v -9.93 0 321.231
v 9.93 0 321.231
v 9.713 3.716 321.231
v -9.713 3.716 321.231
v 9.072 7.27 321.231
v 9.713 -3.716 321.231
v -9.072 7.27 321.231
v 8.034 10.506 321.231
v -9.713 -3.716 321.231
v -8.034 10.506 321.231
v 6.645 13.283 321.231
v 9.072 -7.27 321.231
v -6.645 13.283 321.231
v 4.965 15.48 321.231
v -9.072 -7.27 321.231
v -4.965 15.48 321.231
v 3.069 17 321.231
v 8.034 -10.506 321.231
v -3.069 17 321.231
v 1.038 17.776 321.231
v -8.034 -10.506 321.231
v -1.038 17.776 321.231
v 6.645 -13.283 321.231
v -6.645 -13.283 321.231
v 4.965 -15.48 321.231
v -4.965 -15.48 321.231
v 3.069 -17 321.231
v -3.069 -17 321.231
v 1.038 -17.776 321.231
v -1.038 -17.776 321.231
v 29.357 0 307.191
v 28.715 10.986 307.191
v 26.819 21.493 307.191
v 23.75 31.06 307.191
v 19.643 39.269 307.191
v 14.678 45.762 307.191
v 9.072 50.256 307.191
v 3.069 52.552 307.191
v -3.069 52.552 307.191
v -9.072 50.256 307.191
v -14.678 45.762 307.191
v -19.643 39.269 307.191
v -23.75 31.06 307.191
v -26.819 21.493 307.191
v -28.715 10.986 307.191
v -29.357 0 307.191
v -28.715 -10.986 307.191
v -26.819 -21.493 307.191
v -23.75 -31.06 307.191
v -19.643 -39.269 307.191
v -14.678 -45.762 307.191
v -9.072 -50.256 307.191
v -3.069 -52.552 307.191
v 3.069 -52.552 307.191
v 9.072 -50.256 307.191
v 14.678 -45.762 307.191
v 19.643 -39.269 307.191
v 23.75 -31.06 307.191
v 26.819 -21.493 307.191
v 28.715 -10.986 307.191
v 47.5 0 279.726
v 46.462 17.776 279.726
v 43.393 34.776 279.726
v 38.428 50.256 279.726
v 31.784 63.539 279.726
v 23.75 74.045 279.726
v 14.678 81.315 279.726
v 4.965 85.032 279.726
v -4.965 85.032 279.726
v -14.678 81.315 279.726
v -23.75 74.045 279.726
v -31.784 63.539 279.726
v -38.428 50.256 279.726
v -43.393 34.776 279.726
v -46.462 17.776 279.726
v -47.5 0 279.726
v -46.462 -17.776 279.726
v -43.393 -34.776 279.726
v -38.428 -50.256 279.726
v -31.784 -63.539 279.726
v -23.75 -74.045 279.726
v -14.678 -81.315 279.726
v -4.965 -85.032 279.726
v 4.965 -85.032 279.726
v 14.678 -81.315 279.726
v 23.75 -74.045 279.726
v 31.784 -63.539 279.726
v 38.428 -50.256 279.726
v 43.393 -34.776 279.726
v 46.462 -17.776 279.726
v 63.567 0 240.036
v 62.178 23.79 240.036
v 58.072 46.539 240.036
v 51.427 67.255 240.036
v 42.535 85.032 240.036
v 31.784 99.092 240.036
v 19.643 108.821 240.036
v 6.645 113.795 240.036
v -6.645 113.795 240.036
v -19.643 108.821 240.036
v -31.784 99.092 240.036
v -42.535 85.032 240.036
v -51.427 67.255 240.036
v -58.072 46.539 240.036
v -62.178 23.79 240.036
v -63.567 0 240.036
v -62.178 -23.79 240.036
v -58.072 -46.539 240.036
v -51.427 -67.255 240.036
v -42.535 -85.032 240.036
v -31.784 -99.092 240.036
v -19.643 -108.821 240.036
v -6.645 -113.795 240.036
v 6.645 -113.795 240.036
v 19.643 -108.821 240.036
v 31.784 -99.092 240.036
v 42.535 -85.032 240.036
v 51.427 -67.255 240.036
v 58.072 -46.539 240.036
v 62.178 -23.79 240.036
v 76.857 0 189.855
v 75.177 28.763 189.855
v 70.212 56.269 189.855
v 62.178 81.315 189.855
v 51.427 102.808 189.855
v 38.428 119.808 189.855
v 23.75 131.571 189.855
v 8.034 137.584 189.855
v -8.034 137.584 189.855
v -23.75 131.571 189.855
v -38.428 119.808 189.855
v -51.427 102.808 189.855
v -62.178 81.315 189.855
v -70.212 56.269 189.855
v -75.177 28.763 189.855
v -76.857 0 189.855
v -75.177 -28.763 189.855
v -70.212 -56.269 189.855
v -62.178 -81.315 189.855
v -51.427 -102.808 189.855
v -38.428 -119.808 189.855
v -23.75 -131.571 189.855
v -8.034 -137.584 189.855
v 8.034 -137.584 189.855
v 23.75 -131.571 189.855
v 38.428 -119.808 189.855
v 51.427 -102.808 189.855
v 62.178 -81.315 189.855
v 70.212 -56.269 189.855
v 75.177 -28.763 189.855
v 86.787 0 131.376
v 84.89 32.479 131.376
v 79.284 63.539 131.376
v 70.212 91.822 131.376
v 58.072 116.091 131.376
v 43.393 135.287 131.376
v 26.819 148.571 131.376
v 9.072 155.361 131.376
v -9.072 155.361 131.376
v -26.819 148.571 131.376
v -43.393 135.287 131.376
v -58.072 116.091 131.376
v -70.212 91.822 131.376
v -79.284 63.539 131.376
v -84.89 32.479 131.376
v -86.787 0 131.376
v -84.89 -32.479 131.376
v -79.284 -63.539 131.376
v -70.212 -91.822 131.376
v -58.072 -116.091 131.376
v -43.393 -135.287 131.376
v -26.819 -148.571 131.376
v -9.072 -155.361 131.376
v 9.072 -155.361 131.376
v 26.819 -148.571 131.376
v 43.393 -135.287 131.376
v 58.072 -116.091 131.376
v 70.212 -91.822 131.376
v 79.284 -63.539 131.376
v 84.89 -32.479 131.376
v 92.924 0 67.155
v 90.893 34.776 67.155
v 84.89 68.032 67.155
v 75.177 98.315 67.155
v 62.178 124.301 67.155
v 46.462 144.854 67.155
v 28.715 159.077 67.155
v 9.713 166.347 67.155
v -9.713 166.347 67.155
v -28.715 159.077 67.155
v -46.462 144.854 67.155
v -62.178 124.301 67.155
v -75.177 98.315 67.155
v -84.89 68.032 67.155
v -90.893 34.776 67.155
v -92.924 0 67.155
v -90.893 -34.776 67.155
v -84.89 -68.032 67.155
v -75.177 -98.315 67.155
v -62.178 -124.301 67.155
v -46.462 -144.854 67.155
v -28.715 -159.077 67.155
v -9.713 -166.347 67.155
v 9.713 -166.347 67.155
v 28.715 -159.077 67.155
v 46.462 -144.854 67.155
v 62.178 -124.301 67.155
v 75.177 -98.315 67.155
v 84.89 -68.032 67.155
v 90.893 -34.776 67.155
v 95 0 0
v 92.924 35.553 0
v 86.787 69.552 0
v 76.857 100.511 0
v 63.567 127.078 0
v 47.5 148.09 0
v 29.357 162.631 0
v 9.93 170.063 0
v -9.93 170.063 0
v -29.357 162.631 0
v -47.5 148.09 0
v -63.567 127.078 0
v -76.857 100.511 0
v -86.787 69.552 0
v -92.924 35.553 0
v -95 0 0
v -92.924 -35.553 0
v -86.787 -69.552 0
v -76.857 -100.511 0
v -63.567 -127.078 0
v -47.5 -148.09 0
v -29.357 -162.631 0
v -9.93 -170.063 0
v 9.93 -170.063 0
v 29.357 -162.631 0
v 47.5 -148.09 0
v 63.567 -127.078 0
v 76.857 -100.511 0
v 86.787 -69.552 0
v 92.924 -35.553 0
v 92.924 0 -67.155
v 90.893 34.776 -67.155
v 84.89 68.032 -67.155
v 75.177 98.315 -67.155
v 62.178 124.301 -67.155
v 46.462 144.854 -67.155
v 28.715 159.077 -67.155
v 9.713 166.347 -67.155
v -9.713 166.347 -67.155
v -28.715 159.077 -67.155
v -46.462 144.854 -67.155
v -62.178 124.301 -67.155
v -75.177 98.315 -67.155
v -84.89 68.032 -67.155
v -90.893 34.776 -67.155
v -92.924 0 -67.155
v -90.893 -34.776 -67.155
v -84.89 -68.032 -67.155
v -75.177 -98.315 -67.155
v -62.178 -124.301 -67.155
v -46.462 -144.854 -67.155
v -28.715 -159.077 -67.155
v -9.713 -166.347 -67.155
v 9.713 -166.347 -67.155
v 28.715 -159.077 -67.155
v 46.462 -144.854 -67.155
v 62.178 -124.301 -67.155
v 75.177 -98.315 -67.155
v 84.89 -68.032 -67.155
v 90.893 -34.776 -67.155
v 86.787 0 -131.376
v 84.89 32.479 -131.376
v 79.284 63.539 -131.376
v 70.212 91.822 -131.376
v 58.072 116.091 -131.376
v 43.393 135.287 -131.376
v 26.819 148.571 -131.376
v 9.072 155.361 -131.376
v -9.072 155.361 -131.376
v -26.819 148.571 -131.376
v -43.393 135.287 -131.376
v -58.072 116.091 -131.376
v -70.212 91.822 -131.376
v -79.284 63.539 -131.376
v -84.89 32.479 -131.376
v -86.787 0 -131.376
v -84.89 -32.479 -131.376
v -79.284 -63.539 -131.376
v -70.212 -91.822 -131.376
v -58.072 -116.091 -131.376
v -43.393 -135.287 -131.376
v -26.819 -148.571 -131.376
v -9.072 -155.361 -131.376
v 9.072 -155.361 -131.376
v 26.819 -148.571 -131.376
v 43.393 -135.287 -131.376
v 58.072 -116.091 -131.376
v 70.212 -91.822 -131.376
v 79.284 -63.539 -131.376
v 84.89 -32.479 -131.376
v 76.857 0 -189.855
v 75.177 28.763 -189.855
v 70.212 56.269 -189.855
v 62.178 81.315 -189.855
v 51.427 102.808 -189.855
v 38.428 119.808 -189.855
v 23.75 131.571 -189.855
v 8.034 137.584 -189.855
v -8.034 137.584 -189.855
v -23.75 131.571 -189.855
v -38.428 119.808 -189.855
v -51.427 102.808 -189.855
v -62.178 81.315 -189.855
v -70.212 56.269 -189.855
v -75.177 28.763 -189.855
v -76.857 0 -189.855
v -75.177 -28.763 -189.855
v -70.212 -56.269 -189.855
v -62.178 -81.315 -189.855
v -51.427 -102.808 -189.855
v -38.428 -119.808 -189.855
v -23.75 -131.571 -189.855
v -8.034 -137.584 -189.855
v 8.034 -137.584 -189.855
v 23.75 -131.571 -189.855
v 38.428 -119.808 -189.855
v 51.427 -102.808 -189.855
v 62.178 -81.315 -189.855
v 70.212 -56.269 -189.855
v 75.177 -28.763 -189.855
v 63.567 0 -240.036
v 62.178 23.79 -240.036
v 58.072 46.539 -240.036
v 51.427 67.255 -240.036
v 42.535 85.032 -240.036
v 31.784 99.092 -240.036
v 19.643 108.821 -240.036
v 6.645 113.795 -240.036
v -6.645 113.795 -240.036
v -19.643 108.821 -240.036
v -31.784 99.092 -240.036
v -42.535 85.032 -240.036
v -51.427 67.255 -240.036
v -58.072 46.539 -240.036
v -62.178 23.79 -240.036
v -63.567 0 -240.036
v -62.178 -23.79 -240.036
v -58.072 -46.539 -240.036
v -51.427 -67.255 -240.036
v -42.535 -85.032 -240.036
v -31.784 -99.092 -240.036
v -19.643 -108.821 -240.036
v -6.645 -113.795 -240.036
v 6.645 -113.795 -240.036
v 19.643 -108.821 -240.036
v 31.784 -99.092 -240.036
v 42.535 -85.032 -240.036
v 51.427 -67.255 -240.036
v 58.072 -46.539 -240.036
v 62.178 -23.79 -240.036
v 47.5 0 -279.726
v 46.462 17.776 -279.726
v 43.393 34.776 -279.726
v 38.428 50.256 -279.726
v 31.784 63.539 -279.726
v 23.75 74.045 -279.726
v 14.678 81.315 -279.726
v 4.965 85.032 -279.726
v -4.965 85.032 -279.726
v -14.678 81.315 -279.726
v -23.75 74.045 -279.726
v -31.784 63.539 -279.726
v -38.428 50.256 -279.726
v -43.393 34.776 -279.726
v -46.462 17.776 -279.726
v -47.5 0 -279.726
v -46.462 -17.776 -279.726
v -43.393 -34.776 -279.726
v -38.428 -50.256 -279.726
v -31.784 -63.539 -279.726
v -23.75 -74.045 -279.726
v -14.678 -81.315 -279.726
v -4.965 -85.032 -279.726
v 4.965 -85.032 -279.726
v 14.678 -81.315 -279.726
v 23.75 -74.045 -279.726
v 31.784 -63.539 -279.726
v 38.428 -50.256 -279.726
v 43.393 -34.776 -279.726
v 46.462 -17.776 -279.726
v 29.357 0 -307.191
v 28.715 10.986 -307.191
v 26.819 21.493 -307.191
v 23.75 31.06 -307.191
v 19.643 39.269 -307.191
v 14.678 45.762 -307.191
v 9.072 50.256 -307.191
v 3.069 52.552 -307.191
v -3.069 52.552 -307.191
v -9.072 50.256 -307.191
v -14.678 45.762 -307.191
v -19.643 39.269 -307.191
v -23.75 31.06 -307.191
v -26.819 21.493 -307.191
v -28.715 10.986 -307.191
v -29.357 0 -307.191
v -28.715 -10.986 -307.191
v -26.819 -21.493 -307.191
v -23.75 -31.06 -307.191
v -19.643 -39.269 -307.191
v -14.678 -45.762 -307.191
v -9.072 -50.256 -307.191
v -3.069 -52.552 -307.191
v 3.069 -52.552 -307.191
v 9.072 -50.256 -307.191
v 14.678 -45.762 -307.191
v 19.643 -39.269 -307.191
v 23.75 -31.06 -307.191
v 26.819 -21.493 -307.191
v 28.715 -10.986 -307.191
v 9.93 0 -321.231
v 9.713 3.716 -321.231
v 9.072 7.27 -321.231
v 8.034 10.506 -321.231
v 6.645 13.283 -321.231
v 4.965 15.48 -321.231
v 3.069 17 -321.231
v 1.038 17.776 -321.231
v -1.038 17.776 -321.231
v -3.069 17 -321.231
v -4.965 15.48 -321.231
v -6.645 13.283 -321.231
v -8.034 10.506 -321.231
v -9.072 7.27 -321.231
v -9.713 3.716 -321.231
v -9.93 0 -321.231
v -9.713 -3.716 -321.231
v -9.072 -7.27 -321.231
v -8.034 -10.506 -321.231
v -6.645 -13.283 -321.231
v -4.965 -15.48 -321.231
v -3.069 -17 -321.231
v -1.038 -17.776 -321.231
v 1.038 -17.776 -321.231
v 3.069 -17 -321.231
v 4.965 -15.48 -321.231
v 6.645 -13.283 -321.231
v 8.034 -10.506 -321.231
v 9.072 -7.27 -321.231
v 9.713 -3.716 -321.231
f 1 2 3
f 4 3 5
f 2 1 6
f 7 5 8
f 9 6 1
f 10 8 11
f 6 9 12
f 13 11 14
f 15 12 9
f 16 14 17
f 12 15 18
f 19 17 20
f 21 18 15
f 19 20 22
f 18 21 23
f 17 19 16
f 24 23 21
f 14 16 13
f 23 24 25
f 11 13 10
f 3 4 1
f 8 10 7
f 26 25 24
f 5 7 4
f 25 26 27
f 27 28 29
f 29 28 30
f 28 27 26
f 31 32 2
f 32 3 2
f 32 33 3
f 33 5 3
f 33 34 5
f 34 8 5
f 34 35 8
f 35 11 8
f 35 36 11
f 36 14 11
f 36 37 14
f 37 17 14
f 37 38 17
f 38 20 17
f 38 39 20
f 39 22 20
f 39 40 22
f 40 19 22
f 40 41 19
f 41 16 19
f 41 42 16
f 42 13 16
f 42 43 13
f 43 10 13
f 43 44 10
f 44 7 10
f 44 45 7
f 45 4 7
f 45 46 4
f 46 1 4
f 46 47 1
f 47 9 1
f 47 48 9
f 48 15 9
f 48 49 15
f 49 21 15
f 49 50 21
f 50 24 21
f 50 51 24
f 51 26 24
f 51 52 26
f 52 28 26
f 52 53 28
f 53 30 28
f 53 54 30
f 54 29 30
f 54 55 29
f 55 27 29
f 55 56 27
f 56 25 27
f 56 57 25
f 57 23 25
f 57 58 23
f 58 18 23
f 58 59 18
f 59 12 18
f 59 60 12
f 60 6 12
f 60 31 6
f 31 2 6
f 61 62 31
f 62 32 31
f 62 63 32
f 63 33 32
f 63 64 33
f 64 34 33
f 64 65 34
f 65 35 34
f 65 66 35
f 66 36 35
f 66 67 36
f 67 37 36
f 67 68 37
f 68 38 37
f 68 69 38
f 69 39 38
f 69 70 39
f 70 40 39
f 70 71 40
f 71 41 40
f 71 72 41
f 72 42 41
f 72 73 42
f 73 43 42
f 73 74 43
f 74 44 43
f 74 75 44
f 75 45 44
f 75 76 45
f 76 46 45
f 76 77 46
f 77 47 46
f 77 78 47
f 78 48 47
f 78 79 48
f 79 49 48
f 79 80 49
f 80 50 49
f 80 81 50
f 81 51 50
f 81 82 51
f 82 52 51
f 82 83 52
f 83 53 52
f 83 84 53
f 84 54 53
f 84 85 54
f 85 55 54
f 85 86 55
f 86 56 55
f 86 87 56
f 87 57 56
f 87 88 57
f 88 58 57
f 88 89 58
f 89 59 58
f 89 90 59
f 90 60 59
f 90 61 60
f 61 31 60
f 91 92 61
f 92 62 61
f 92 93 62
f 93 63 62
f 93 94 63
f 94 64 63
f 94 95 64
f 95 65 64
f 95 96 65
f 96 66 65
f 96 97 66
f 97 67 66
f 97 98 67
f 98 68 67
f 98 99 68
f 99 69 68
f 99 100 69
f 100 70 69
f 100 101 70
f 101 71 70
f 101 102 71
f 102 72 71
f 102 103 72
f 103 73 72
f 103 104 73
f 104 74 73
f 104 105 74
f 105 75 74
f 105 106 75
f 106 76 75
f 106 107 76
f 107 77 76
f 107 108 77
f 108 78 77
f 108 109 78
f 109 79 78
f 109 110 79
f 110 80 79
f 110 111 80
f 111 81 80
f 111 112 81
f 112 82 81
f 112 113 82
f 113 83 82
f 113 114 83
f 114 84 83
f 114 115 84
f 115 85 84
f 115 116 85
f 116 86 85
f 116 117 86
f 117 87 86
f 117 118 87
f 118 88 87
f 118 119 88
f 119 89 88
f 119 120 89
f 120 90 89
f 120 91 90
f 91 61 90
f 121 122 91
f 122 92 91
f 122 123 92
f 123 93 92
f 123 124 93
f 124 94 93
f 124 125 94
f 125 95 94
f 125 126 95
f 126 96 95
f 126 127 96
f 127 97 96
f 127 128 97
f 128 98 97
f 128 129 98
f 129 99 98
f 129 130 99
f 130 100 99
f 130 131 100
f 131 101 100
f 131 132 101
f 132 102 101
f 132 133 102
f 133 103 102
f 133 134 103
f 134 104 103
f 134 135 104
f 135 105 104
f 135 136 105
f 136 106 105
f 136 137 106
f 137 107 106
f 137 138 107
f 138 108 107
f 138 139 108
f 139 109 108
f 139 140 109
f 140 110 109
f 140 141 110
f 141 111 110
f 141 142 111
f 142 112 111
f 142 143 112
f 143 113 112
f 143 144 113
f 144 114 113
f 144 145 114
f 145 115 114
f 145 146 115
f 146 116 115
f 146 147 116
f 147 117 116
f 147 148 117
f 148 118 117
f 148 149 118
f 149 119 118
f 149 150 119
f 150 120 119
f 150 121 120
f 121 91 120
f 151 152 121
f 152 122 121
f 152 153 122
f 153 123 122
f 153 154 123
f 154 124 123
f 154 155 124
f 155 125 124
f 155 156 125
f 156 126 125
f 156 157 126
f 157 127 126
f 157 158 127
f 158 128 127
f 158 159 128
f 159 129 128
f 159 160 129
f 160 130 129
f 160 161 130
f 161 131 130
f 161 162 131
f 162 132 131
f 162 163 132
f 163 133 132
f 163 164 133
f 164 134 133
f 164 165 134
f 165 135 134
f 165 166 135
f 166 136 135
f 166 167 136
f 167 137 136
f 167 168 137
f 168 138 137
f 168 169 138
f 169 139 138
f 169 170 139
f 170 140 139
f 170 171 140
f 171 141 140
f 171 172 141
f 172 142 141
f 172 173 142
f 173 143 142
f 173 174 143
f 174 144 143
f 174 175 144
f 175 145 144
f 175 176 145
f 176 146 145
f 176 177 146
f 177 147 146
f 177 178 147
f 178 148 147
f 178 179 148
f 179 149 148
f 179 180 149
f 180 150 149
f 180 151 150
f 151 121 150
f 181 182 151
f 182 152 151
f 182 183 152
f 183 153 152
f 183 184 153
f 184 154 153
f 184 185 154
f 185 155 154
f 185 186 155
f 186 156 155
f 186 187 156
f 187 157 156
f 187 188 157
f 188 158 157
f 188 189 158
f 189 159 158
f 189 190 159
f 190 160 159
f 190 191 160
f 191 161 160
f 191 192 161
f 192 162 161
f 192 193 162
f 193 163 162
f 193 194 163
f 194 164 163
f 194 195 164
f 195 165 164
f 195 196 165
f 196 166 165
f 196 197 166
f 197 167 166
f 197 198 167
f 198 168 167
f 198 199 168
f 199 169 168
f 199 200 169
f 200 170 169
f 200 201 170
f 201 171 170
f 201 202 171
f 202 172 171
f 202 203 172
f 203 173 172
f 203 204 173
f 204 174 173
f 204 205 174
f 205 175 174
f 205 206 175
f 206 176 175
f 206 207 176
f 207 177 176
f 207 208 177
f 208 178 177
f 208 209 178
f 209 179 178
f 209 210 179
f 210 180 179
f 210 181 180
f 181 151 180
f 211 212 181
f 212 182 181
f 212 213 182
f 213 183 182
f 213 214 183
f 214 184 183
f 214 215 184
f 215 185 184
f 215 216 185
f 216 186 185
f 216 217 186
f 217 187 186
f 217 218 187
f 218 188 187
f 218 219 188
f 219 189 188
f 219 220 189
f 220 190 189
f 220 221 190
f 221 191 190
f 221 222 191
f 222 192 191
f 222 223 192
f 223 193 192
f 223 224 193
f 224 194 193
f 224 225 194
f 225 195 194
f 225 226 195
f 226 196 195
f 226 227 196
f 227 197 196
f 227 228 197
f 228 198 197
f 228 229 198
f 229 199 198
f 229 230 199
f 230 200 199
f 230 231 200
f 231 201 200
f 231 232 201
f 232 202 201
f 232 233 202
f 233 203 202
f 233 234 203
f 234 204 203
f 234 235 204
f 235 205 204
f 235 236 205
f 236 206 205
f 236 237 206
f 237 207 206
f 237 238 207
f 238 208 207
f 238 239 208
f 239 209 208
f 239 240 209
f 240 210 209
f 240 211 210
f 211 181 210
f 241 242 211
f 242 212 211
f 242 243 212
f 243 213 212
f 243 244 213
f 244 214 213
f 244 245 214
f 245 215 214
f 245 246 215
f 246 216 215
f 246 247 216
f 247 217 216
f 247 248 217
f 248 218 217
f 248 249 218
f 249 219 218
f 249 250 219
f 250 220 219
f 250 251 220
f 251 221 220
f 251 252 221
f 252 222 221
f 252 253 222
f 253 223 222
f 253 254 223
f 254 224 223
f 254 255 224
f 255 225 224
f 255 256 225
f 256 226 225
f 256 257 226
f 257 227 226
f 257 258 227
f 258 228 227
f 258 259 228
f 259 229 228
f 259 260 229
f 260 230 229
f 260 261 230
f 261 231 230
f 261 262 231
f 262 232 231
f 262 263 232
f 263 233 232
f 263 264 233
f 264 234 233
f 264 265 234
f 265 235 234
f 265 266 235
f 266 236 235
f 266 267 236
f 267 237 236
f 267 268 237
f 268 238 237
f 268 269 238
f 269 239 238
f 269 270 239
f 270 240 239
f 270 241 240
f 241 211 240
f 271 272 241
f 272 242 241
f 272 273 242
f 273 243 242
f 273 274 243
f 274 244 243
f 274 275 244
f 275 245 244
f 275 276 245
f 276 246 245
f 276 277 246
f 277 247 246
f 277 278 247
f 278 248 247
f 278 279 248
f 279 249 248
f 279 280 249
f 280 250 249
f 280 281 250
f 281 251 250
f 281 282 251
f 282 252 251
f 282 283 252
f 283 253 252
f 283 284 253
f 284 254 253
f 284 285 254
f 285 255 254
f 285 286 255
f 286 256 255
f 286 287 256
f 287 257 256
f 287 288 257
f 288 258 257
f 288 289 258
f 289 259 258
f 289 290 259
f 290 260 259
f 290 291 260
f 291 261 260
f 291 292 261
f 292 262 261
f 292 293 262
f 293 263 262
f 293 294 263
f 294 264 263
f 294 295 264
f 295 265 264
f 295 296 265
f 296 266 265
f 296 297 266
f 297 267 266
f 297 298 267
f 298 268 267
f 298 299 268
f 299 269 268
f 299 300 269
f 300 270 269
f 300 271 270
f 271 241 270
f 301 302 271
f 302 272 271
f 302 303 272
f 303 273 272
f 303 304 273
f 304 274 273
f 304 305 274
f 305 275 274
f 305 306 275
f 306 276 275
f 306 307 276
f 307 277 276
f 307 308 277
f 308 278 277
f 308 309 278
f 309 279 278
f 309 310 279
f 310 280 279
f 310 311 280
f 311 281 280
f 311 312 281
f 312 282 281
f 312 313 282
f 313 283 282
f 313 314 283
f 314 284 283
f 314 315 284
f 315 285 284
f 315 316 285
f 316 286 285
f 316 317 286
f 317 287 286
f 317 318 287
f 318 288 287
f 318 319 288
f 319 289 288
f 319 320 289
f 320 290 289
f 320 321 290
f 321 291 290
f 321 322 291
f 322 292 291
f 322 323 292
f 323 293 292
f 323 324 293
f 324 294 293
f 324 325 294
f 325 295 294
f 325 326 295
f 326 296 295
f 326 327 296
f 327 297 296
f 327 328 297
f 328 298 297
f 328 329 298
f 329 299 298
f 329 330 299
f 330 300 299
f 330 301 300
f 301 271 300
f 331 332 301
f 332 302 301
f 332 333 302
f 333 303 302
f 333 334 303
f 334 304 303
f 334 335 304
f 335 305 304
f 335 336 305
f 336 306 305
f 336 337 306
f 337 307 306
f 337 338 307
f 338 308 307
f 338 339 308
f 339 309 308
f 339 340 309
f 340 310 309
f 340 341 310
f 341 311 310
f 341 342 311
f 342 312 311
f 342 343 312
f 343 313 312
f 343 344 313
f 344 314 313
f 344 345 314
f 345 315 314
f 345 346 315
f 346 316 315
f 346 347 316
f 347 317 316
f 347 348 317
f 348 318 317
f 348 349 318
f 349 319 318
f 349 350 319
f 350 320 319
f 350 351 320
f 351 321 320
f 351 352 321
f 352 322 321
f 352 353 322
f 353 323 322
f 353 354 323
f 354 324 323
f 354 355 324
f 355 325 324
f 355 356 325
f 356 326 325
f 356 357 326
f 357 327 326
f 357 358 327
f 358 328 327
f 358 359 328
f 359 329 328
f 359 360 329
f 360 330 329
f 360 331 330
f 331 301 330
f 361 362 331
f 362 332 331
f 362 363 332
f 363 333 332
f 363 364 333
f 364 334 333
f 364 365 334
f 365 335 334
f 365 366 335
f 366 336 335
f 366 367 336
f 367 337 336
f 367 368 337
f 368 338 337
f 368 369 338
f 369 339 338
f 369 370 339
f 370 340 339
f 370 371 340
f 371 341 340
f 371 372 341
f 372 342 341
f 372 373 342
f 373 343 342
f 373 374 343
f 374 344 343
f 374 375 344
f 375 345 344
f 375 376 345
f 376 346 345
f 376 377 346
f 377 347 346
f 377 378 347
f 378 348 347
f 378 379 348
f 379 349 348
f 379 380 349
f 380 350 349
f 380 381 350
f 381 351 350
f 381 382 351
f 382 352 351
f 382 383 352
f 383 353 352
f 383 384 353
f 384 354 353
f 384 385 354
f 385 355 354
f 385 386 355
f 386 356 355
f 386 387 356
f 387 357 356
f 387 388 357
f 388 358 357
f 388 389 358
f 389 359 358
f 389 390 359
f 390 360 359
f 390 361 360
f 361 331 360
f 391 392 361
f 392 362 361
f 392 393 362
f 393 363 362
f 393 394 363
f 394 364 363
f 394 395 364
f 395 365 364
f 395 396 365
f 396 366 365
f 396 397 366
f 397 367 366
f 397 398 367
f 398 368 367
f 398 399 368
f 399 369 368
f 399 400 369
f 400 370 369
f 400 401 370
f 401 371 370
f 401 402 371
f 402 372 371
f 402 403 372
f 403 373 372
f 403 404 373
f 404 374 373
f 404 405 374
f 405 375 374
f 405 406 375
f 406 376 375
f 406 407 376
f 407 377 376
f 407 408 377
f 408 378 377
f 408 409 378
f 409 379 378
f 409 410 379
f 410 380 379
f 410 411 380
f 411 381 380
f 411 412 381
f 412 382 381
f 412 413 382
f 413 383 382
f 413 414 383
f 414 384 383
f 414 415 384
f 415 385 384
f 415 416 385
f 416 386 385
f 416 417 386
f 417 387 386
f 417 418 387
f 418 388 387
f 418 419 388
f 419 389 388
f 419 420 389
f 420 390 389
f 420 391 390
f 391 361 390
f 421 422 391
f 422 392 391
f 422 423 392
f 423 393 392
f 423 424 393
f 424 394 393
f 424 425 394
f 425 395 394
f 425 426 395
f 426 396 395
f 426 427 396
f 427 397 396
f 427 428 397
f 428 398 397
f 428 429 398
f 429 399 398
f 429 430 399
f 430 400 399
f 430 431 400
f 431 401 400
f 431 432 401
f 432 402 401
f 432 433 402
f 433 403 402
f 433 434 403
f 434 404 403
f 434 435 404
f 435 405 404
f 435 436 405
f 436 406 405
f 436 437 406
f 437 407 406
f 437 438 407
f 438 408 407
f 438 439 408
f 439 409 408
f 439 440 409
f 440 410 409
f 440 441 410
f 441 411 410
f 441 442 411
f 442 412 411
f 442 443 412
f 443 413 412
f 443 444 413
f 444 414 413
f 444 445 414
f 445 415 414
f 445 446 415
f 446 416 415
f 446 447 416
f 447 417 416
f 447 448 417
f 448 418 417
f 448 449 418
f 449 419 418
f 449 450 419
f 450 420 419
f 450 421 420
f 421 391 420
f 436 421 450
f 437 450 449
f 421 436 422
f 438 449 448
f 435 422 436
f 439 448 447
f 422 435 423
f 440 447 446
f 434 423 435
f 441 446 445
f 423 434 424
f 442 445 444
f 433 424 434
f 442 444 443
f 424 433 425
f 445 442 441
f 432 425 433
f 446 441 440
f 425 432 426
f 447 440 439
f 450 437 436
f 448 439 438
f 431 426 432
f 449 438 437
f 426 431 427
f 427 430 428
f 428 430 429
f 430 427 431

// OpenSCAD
// Generated by SolidPython 1.0.1 on 2020-07-29 00:46:46


scale(v = [5, 9, 17]) {
	sphere(r = 19);
}
/***********************************************
*********      SolidPython code:      **********
************************************************
 
# import packages: SolidPython
from solid import *
from solid.utils import *
from itertools import chain, combinations, permutations


class Resize:

    def __init__(self, scad_file):
        self.scad_file = scad_file
        #self.scad_file = import_scad(scad_file)
        # cone/cylinder param:
        self.r1 = 0
        self.r2 = 0
        self.h = 0
        # rectangular prism param:
        self.w = 0
        self.l = 0
        # ellipse param:
        self.r = 0

    # import OpenScad code (file name corresponds to shape)


    # classify shape + parameters
    def assign(self, param1, param2, param3):
        if self.scad_file == 'cone.scad':
            self.r1 = param1
            self.r2 = param2
            self.h = param3
        elif self.scad_file == 'cylinder.scad':
            self.r1 = param1
            self.r2 = param2
            self.h = param3
        elif self.scad_file == 'rectangularPrism.scad':
            self.h = param1
            self.l = param2
            self.w = param3
        else:
            self.r = param1
            self.h = param2

    # resize parameters
    def iterate(self):
        x = range(3, 20, 2)
        i = 1
        if self.scad_file == 'cone.scad':
            tempList = list(permutations(x, 2))
            for temp in tempList:
                param1 = temp[0]
                param2 = temp[1]
                filepath = 'produced_scad_files/' + 'cone' + str(param1) + '_' + str(param2) + '_' + '.scad'
                scad_render_to_file(cylinder(h=param1, r1=param2, r2=0), filepath)

        elif self.scad_file == 'cylinder.scad':
            tempList = list(permutations(x, 3))
            for temp in tempList:
                param1 = temp[0]
                param2 = temp[1]
                filepath = 'produced_scad_files/' + 'cylinder' + str(param1) + '_' + str(param2) + '_' + '.scad'
                scad_render_to_file(cylinder(h=param1, r1=param2, r2=param2), filepath)

        elif self.scad_file == 'rectangularPrism.scad':
            tempList = list(permutations(x, 3))
            for temp in tempList:
                param1 = temp[0]
                param2 = temp[1]
                param3 = temp[2]
                filepath = 'produced_scad_files/' + 'rectangularPrism' + str(param1) + '_' + str(param2) + '_' + str(
                    param3) + '.scad'
                scad_render_to_file(cube(size=(param1, param2, param3)), filepath)

        elif self.scad_file == 'ellipse.scad':
            tempList = list(permutations(x, 4))
            for temp in tempList:
                param1 = temp[0]
                param2 = temp[1]
                param3 = temp[2]
                param4 = temp[3]
                filepath = 'produced_scad_files/' + 'ellipse' + str(param1) + '_' + str(param2) + '_' + str(param3) + '_' + str(param4) + '.scad'
                scad_render_to_file(scale([param1, param2, param3])(sphere(r=param4)), filepath)

    def render_to_scadfile(self):
        scad_render_to_file(scad, 'example.scad') 
 
************************************************/
